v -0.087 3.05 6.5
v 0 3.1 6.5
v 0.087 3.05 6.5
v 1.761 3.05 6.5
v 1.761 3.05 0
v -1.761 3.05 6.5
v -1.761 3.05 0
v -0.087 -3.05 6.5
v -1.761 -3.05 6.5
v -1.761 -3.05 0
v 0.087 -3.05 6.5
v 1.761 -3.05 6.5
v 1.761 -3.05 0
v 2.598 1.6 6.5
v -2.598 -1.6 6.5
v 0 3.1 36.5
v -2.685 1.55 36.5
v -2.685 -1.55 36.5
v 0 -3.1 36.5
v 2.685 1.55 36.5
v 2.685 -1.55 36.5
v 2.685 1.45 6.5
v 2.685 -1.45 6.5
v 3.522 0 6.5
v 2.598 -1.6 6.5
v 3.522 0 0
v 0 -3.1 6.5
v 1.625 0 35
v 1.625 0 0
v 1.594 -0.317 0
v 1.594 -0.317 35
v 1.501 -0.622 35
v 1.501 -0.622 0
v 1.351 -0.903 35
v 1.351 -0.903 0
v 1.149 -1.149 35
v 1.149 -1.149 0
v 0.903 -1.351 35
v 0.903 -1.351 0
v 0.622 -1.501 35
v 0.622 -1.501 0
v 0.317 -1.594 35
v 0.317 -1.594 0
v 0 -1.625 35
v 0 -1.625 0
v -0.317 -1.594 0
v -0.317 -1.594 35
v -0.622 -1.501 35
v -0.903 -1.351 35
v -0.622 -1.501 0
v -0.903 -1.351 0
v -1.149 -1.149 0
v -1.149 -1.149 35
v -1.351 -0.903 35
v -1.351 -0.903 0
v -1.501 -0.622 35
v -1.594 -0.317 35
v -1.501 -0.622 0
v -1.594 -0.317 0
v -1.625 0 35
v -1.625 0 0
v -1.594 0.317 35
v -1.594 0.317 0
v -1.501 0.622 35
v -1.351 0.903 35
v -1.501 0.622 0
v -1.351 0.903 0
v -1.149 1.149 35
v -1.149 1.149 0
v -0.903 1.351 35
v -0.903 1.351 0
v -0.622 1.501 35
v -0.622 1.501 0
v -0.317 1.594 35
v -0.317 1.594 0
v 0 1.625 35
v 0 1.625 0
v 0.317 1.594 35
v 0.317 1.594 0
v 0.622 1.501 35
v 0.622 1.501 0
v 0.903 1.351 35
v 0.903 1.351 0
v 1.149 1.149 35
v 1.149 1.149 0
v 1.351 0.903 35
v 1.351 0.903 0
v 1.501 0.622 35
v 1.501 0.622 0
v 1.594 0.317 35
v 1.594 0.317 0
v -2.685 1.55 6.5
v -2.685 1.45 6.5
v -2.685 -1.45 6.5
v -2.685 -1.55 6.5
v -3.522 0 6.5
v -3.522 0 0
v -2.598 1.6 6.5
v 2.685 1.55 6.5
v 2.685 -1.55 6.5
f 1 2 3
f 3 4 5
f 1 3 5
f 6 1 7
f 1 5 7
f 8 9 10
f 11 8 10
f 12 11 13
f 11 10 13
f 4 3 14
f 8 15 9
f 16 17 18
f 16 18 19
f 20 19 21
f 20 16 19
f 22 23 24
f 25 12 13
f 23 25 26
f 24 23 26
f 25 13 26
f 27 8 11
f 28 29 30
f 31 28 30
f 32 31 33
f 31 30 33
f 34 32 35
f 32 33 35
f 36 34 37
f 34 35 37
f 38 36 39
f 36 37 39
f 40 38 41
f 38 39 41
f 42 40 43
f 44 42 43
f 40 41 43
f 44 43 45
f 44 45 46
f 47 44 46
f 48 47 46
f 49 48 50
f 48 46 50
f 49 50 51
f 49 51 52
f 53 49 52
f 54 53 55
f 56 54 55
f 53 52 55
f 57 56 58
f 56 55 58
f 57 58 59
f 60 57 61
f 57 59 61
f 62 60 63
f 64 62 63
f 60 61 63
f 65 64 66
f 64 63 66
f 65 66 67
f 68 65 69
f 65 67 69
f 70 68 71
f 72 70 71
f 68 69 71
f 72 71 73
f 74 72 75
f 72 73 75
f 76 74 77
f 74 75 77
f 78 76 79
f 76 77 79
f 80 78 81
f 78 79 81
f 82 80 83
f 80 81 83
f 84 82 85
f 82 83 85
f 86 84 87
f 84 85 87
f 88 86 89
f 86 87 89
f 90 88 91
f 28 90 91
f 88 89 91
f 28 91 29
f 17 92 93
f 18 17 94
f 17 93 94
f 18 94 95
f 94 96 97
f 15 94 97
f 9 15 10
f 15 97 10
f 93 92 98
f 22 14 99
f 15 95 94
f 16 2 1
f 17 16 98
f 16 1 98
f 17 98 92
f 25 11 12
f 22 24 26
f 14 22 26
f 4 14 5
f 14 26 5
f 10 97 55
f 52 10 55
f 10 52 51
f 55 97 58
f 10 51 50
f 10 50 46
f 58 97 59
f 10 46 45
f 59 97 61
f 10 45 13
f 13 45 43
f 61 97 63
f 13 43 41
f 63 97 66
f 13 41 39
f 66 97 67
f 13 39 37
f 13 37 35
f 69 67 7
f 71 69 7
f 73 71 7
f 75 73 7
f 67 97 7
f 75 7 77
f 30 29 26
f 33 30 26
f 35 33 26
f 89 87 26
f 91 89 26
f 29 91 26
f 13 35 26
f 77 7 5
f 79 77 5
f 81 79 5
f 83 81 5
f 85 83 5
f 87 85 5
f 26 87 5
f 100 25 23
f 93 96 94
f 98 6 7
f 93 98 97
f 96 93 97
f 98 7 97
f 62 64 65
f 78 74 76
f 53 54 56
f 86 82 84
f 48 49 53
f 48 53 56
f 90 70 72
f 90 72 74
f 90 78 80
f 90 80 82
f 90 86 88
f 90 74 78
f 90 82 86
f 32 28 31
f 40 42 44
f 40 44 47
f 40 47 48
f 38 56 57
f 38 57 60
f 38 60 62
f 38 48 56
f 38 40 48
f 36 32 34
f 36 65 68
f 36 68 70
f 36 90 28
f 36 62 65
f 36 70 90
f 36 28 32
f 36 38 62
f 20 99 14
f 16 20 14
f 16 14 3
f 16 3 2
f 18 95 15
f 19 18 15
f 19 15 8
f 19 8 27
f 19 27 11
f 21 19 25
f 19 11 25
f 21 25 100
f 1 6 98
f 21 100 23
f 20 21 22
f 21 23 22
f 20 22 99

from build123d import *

# Parameters (mm, degrees)
F1_DEPTH = 6.5
F3_DEPTH = 30
F4_R     = 1.625
F5_DEPTH = 35


with BuildPart() as f1:
    # F0 (on Top) → F1 (new body)
    with BuildSketch(Plane.XY):
        Polygon((-3.521837, 0), (-1.760918, -3.05), (1.760918, -3.05), (3.521837, 0), (1.760918, 3.05), (-1.760918, 3.05), align=None)
    extrude(amount=F1_DEPTH)

    # F2 (on face) → F3 (join)
    with BuildSketch(Plane.XY.offset(6.5)):
        Polygon((2.684679, 1.55), (0, 3.1), (-2.684679, 1.55), (-2.684679, -1.55), (0, -3.1), (2.684679, -1.55), align=None)
    extrude(amount=F3_DEPTH)

    # F4 (on face) → F5 (cut)
    with BuildSketch(Plane(origin=(0, 0, 0), x_dir=(1, 0, 0), z_dir=(0, 0, -1))):
        Circle(F4_R)
    extrude(amount=-F5_DEPTH, mode=Mode.SUBTRACT)


solid = f1.part
